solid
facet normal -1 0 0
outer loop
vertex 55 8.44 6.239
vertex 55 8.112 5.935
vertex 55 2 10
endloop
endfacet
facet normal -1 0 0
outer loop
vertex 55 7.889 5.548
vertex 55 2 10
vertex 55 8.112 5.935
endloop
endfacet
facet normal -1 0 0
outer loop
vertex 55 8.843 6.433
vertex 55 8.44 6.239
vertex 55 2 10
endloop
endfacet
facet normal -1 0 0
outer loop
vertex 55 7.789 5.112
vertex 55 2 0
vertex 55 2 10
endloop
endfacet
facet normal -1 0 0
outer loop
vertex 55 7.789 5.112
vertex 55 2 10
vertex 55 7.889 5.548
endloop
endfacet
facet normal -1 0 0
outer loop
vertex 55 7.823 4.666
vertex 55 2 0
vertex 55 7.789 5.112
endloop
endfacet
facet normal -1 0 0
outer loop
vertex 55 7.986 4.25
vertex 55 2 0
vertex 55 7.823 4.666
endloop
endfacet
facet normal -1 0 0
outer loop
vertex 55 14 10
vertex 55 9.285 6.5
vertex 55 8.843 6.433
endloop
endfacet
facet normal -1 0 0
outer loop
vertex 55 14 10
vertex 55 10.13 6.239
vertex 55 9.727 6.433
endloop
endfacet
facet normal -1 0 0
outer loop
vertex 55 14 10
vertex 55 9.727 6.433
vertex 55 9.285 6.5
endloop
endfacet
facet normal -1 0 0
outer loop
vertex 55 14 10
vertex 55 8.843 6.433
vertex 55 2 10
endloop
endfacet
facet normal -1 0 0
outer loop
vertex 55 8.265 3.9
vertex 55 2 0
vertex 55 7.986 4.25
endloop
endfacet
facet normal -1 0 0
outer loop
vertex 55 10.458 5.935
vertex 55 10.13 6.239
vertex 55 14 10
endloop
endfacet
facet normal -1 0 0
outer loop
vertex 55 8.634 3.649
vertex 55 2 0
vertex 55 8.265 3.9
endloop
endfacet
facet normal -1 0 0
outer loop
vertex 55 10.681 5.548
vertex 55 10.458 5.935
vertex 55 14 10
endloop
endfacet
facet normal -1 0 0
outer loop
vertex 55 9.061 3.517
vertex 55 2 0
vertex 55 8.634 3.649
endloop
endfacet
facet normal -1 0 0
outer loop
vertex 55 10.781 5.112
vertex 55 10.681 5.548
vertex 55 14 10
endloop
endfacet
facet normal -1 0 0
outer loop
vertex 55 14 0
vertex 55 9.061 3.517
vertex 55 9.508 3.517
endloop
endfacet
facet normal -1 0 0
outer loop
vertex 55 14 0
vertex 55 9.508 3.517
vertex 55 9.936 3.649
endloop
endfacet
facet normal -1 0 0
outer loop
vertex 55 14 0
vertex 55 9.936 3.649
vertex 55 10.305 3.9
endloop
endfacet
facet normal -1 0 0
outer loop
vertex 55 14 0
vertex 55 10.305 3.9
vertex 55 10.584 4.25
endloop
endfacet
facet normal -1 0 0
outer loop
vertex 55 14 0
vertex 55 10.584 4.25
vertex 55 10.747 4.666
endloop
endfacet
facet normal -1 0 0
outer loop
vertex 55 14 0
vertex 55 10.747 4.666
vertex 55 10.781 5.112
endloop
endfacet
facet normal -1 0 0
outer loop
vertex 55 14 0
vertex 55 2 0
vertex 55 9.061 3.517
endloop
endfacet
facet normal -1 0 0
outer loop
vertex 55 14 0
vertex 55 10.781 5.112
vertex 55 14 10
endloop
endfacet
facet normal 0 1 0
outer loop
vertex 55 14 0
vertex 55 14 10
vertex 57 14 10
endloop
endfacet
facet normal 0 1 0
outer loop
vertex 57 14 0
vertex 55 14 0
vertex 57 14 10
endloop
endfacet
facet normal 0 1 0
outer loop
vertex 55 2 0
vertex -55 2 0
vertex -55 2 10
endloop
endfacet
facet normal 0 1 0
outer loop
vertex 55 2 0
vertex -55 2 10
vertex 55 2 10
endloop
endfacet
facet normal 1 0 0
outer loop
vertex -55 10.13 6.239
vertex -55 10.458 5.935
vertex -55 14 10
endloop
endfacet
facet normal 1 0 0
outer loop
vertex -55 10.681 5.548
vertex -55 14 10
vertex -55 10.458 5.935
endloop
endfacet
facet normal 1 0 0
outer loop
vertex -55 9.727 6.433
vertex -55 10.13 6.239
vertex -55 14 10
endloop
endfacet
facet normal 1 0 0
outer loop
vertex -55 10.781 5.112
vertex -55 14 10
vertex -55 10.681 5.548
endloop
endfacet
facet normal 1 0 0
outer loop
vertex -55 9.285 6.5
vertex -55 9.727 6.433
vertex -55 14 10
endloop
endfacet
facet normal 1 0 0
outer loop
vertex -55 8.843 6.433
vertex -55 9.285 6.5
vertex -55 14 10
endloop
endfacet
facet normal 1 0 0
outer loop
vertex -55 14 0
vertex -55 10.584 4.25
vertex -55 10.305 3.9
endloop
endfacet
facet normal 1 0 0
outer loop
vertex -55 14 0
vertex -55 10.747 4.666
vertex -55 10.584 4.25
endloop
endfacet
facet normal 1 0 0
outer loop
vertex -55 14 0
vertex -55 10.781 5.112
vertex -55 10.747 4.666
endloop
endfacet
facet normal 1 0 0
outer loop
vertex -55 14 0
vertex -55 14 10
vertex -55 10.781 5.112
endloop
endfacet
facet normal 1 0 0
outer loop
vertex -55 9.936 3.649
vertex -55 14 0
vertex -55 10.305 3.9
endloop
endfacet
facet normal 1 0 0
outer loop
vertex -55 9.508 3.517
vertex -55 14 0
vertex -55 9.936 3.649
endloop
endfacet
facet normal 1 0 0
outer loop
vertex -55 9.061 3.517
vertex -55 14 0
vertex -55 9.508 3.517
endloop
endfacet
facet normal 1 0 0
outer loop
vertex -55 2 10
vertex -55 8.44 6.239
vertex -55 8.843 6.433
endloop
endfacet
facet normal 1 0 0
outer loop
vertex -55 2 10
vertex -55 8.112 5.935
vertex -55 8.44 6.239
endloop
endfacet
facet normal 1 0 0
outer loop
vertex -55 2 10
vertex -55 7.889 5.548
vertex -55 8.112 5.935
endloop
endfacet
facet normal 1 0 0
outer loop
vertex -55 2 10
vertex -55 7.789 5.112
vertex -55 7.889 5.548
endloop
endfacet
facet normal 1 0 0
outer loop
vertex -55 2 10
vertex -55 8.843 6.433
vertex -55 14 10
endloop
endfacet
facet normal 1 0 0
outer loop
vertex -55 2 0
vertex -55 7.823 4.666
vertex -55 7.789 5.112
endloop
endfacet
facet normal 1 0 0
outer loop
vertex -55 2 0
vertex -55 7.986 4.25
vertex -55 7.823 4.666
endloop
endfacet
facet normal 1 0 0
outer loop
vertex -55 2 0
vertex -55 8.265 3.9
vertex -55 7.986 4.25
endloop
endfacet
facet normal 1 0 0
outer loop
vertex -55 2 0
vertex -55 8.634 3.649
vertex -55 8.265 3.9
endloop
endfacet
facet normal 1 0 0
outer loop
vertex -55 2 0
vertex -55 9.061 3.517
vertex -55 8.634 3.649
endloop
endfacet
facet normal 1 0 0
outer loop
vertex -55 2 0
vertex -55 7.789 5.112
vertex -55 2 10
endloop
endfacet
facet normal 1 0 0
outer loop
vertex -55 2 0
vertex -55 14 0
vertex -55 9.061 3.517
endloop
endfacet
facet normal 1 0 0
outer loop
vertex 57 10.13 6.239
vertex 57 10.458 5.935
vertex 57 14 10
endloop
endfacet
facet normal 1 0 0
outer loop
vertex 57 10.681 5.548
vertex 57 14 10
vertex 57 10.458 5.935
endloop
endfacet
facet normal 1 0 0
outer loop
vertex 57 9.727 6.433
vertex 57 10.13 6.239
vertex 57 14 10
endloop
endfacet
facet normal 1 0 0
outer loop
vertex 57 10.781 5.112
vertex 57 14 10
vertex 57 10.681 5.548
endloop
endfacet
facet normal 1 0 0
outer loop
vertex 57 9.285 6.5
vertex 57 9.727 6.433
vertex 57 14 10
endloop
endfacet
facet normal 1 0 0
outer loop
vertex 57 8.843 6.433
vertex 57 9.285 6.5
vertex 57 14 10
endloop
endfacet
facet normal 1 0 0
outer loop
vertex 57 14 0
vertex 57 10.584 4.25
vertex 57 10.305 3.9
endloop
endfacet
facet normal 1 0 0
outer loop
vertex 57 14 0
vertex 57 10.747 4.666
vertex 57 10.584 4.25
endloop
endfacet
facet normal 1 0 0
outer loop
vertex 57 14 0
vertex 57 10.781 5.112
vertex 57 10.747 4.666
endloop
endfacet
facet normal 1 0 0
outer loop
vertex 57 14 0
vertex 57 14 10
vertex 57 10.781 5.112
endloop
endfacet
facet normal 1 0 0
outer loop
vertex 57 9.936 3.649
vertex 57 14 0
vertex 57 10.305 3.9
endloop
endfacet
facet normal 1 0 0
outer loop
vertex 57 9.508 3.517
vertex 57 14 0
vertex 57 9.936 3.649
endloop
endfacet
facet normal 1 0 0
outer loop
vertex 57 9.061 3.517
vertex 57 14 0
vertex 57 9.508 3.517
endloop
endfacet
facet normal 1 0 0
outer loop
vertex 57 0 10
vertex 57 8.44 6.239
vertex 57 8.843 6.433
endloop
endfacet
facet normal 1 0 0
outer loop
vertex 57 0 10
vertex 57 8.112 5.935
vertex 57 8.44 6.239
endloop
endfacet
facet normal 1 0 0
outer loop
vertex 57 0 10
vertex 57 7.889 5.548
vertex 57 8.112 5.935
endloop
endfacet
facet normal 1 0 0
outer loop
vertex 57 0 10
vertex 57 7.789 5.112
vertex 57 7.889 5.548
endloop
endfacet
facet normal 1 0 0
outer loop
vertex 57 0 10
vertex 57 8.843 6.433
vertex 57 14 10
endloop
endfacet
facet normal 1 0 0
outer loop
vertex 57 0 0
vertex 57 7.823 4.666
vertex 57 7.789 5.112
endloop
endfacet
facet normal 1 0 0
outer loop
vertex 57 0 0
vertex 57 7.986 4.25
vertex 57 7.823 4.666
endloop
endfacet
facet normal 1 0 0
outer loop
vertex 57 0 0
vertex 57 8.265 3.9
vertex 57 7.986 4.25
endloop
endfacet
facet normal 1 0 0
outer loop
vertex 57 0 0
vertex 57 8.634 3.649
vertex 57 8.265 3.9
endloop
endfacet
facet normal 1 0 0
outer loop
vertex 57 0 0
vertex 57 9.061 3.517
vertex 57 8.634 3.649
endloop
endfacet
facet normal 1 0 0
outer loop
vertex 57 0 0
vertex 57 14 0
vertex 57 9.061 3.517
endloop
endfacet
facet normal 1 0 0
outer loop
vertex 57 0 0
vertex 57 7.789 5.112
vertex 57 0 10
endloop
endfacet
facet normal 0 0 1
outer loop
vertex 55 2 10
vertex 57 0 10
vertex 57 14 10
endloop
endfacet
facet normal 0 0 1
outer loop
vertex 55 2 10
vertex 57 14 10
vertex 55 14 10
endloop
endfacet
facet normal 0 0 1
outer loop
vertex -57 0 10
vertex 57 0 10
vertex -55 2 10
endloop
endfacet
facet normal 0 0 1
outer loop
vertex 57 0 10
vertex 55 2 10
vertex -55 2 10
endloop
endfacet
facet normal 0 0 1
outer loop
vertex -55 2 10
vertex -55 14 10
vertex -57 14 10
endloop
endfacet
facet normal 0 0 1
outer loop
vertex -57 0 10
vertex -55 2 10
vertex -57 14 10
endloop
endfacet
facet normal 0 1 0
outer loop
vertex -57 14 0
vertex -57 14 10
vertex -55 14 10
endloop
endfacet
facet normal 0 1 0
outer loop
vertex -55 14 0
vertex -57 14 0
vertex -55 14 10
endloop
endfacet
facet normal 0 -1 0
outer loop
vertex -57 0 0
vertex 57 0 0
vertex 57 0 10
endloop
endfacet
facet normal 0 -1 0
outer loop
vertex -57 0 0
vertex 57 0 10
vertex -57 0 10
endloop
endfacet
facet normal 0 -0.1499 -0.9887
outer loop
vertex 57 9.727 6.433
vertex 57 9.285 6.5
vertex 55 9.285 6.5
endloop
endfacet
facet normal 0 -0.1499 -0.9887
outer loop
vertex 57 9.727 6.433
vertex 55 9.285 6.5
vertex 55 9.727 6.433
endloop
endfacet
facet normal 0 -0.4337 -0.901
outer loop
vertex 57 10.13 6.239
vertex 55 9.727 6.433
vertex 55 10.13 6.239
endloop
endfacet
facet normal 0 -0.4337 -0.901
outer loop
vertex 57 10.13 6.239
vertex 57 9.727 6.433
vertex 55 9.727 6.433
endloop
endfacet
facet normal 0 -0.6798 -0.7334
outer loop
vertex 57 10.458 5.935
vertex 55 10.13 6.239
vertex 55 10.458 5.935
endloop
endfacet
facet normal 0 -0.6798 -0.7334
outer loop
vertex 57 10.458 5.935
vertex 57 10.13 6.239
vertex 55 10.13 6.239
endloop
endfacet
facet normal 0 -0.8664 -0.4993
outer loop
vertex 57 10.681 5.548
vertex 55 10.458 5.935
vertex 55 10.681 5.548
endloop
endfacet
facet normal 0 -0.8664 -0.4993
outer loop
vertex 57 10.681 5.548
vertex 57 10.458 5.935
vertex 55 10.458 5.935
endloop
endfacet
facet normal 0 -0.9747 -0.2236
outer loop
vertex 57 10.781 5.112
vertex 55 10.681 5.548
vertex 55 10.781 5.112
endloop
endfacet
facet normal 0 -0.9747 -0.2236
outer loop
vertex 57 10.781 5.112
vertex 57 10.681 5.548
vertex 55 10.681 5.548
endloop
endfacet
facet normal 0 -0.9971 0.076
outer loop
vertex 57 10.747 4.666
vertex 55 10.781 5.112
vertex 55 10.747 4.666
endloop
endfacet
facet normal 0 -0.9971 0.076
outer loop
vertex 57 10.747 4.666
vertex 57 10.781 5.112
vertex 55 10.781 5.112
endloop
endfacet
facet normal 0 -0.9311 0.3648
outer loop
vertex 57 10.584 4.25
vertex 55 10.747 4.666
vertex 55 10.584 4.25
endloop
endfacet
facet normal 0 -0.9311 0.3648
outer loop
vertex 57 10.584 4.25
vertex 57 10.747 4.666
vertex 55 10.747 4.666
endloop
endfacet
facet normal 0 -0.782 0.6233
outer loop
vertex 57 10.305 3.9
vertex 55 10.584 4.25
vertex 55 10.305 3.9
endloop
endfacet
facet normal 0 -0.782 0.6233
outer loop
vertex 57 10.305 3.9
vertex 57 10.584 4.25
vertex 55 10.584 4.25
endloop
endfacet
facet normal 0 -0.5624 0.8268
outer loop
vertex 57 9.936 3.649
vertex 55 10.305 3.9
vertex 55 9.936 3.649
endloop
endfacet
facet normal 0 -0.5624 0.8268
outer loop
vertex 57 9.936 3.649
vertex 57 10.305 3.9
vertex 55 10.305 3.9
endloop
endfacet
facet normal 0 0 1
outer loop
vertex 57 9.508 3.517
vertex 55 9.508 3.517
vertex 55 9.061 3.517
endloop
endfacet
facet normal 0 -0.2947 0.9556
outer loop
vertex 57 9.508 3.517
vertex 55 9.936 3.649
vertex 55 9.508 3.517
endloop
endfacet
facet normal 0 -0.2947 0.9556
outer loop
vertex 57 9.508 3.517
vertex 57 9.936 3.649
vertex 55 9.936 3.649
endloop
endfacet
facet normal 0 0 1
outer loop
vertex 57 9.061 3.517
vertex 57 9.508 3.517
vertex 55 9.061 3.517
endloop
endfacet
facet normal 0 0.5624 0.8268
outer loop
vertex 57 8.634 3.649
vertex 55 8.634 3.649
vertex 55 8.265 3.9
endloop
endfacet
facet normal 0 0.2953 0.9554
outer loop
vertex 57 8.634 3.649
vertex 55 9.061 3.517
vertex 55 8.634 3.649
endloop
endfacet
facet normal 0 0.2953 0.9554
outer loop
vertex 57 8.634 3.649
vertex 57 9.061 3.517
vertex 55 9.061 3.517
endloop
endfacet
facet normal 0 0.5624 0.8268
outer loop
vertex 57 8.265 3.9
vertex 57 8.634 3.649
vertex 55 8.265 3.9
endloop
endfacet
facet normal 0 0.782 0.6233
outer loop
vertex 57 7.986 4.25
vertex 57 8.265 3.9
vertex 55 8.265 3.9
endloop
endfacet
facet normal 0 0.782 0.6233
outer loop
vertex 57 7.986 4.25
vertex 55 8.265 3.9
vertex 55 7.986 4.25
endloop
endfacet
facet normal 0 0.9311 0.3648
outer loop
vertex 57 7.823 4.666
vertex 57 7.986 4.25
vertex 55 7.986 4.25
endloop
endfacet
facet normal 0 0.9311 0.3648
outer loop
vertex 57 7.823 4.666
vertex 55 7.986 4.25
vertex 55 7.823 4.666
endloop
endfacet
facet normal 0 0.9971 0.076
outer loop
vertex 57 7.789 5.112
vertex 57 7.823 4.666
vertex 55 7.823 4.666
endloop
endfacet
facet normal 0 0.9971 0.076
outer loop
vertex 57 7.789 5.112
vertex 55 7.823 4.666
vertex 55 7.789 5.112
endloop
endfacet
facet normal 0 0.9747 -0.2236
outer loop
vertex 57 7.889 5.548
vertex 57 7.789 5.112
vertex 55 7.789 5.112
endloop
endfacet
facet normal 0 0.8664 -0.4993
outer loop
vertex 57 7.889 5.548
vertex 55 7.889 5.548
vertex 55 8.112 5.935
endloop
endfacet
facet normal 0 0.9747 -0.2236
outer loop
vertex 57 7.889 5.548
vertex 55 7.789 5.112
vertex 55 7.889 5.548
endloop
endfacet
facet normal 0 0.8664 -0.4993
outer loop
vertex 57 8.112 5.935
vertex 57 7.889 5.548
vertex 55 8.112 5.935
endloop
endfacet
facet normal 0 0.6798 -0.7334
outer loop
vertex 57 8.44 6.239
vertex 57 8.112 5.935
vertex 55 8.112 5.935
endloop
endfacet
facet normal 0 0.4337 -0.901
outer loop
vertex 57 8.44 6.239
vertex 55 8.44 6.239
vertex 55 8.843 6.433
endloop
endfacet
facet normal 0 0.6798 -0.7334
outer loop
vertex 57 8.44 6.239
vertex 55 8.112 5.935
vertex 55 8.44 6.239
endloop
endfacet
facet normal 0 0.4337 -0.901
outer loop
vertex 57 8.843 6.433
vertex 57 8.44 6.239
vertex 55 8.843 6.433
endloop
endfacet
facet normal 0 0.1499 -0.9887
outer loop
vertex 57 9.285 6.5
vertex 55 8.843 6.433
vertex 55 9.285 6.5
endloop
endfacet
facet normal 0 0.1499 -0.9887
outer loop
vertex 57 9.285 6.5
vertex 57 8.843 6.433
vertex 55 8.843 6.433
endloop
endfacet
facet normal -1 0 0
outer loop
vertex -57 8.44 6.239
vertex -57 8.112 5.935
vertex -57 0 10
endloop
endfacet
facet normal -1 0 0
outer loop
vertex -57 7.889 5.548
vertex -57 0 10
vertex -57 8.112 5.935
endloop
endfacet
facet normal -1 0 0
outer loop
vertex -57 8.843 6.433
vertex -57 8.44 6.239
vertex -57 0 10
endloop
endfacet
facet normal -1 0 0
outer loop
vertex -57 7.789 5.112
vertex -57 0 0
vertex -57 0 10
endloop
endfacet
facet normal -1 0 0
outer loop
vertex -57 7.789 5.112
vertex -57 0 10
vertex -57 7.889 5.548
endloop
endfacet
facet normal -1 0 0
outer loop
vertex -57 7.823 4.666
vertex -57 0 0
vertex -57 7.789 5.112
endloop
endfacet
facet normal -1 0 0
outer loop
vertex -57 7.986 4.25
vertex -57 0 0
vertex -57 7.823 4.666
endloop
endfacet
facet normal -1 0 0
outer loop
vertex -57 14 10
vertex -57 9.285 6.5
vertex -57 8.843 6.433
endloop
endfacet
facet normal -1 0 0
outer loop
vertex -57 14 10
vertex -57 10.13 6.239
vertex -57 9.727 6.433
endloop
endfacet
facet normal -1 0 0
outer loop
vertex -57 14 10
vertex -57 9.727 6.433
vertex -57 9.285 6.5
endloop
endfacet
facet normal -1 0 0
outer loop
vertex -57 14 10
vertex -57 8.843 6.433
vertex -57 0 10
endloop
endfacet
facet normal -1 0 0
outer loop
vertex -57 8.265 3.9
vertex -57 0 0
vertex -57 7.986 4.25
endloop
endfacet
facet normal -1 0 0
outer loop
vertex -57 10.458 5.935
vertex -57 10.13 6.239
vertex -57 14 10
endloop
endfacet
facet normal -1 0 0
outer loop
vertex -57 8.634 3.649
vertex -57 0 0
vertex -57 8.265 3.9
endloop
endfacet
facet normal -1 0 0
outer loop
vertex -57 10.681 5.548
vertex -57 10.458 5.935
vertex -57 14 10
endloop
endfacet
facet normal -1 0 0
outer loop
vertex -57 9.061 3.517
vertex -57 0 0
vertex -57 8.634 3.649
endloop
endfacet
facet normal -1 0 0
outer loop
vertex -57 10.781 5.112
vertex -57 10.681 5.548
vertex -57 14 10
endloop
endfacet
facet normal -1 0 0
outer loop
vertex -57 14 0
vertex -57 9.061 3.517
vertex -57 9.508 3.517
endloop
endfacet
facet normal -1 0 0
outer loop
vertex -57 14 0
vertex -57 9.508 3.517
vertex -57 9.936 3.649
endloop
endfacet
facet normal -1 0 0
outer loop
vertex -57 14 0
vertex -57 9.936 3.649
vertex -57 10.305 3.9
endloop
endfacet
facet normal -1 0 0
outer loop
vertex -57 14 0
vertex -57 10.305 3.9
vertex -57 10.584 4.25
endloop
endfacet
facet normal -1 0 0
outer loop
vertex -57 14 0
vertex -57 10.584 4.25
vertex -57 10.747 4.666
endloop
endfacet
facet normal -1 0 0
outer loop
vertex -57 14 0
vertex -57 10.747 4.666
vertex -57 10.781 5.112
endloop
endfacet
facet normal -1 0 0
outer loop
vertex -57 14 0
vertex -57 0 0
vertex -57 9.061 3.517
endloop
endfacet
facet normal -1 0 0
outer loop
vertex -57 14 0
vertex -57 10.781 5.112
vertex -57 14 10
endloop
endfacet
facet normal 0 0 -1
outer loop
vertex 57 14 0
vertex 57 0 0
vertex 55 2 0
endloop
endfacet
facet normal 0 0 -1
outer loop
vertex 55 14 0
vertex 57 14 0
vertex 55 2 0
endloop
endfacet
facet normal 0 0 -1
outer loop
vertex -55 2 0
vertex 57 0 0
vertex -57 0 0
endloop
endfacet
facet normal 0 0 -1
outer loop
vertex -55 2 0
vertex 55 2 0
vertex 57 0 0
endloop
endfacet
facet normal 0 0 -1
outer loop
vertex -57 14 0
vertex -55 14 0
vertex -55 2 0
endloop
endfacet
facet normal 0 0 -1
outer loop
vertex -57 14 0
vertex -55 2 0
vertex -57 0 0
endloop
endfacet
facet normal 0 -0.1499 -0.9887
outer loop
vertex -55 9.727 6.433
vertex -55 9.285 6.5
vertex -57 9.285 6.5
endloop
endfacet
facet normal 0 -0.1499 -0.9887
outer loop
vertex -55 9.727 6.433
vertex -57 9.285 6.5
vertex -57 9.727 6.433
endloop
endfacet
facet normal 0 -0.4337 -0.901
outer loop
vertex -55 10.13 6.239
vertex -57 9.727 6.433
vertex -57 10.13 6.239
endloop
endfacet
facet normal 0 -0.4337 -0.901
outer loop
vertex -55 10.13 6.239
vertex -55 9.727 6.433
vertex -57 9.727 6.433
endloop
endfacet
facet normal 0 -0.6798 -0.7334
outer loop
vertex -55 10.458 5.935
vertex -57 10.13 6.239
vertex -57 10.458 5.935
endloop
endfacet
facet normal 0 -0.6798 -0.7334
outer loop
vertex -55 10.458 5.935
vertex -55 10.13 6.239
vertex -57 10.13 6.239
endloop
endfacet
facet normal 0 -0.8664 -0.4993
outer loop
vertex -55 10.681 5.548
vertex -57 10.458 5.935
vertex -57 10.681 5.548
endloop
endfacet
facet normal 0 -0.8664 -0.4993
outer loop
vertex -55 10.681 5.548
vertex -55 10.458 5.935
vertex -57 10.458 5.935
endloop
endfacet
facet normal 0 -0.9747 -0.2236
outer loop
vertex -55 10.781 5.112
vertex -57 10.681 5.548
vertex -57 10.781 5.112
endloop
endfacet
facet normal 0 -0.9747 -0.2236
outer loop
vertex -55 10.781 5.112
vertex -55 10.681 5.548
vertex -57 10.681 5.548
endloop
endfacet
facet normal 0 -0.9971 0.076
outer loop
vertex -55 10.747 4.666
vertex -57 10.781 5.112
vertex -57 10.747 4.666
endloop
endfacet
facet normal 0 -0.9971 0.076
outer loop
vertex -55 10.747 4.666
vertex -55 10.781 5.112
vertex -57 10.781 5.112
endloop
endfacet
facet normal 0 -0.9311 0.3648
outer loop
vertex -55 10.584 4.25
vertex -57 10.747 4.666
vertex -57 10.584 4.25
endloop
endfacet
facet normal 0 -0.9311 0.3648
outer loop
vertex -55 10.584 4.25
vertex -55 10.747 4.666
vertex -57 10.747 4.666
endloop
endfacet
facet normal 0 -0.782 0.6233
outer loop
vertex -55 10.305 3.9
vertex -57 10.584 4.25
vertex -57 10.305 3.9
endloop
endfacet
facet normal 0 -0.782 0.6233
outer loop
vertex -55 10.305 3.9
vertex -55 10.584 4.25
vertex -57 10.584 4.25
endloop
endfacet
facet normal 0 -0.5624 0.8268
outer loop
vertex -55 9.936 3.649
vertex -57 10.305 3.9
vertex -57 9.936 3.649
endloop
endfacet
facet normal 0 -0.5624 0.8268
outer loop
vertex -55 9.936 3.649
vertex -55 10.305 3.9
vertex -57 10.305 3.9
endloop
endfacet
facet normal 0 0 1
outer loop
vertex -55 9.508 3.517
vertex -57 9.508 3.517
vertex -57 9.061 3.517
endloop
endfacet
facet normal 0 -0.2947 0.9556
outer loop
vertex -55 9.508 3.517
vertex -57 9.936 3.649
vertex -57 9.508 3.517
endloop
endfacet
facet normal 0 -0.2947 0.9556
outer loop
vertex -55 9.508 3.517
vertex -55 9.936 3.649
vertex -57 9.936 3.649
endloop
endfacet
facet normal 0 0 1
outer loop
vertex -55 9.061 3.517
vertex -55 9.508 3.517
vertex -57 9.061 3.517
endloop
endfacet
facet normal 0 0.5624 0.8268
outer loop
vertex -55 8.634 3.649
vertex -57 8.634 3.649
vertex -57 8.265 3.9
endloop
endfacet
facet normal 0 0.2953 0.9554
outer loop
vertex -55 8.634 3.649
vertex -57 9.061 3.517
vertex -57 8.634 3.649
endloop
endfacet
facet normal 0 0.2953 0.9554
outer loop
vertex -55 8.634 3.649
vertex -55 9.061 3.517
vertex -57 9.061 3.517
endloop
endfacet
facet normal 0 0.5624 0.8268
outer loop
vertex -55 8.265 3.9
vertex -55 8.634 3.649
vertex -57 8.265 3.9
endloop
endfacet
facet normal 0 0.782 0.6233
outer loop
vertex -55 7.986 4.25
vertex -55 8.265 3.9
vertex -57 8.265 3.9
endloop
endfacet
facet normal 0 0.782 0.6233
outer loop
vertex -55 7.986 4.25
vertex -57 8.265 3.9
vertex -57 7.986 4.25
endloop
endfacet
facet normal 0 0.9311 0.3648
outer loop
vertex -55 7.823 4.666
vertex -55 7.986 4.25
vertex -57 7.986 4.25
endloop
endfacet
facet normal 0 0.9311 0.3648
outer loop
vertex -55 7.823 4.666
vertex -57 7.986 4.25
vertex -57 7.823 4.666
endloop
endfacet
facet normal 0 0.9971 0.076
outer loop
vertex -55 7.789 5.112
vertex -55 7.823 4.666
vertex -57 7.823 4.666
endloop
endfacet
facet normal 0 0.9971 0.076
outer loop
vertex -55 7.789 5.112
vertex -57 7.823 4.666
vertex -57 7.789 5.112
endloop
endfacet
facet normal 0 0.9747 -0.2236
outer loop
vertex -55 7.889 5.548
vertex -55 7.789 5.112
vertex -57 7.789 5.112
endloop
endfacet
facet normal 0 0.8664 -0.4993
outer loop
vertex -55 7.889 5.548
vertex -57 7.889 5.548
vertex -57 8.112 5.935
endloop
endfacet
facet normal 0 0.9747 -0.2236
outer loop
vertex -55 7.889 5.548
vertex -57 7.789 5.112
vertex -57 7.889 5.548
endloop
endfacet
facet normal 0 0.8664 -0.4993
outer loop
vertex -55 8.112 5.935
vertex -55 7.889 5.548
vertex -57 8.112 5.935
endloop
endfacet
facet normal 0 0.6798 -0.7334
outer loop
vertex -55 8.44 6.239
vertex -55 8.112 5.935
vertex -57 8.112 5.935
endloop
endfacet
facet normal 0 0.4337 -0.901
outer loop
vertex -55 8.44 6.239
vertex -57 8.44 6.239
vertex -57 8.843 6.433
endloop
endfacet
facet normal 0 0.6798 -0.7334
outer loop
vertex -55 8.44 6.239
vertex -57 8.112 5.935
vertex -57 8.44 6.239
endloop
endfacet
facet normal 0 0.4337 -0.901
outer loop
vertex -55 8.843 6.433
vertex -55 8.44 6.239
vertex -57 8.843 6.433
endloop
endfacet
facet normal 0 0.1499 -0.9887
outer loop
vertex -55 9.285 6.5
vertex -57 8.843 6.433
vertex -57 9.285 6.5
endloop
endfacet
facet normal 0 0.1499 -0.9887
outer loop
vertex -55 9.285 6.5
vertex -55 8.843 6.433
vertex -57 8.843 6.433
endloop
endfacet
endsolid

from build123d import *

# Parameters (mm, degrees)
BOSS_EXTRU_1_DEPTH           = 10
ENL_V_MAT_EXTRU_1_DEPTH      = 116.290936331
ENL_V_MAT_EXTRU_1_DEPTH_BACK = 116.290936331
ESQUISSE2_R                  = 1.5


with BuildPart() as part:
    # Esquisse1 → Boss.-Extru.1 (new body)
    with BuildSketch(Plane.XY):
        Polygon((57, 0), (-57, 0), (-57, 14), (-55, 14), (-55, 2), (55, 2), (55, 14), (57, 14), align=None)
    extrude(amount=BOSS_EXTRU_1_DEPTH)

    # Esquisse2 → Enlèv. mat.-Extru.1 (cut, two sides: drawn at the far end of the back side and taken through both)
    with BuildSketch(Plane.ZY.offset(57).offset(-ENL_V_MAT_EXTRU_1_DEPTH_BACK)):
        with Locations((5, 9.284897648)):
            Circle(ESQUISSE2_R)
    extrude(amount=ENL_V_MAT_EXTRU_1_DEPTH + ENL_V_MAT_EXTRU_1_DEPTH_BACK, mode=Mode.SUBTRACT)


solid = part.part
